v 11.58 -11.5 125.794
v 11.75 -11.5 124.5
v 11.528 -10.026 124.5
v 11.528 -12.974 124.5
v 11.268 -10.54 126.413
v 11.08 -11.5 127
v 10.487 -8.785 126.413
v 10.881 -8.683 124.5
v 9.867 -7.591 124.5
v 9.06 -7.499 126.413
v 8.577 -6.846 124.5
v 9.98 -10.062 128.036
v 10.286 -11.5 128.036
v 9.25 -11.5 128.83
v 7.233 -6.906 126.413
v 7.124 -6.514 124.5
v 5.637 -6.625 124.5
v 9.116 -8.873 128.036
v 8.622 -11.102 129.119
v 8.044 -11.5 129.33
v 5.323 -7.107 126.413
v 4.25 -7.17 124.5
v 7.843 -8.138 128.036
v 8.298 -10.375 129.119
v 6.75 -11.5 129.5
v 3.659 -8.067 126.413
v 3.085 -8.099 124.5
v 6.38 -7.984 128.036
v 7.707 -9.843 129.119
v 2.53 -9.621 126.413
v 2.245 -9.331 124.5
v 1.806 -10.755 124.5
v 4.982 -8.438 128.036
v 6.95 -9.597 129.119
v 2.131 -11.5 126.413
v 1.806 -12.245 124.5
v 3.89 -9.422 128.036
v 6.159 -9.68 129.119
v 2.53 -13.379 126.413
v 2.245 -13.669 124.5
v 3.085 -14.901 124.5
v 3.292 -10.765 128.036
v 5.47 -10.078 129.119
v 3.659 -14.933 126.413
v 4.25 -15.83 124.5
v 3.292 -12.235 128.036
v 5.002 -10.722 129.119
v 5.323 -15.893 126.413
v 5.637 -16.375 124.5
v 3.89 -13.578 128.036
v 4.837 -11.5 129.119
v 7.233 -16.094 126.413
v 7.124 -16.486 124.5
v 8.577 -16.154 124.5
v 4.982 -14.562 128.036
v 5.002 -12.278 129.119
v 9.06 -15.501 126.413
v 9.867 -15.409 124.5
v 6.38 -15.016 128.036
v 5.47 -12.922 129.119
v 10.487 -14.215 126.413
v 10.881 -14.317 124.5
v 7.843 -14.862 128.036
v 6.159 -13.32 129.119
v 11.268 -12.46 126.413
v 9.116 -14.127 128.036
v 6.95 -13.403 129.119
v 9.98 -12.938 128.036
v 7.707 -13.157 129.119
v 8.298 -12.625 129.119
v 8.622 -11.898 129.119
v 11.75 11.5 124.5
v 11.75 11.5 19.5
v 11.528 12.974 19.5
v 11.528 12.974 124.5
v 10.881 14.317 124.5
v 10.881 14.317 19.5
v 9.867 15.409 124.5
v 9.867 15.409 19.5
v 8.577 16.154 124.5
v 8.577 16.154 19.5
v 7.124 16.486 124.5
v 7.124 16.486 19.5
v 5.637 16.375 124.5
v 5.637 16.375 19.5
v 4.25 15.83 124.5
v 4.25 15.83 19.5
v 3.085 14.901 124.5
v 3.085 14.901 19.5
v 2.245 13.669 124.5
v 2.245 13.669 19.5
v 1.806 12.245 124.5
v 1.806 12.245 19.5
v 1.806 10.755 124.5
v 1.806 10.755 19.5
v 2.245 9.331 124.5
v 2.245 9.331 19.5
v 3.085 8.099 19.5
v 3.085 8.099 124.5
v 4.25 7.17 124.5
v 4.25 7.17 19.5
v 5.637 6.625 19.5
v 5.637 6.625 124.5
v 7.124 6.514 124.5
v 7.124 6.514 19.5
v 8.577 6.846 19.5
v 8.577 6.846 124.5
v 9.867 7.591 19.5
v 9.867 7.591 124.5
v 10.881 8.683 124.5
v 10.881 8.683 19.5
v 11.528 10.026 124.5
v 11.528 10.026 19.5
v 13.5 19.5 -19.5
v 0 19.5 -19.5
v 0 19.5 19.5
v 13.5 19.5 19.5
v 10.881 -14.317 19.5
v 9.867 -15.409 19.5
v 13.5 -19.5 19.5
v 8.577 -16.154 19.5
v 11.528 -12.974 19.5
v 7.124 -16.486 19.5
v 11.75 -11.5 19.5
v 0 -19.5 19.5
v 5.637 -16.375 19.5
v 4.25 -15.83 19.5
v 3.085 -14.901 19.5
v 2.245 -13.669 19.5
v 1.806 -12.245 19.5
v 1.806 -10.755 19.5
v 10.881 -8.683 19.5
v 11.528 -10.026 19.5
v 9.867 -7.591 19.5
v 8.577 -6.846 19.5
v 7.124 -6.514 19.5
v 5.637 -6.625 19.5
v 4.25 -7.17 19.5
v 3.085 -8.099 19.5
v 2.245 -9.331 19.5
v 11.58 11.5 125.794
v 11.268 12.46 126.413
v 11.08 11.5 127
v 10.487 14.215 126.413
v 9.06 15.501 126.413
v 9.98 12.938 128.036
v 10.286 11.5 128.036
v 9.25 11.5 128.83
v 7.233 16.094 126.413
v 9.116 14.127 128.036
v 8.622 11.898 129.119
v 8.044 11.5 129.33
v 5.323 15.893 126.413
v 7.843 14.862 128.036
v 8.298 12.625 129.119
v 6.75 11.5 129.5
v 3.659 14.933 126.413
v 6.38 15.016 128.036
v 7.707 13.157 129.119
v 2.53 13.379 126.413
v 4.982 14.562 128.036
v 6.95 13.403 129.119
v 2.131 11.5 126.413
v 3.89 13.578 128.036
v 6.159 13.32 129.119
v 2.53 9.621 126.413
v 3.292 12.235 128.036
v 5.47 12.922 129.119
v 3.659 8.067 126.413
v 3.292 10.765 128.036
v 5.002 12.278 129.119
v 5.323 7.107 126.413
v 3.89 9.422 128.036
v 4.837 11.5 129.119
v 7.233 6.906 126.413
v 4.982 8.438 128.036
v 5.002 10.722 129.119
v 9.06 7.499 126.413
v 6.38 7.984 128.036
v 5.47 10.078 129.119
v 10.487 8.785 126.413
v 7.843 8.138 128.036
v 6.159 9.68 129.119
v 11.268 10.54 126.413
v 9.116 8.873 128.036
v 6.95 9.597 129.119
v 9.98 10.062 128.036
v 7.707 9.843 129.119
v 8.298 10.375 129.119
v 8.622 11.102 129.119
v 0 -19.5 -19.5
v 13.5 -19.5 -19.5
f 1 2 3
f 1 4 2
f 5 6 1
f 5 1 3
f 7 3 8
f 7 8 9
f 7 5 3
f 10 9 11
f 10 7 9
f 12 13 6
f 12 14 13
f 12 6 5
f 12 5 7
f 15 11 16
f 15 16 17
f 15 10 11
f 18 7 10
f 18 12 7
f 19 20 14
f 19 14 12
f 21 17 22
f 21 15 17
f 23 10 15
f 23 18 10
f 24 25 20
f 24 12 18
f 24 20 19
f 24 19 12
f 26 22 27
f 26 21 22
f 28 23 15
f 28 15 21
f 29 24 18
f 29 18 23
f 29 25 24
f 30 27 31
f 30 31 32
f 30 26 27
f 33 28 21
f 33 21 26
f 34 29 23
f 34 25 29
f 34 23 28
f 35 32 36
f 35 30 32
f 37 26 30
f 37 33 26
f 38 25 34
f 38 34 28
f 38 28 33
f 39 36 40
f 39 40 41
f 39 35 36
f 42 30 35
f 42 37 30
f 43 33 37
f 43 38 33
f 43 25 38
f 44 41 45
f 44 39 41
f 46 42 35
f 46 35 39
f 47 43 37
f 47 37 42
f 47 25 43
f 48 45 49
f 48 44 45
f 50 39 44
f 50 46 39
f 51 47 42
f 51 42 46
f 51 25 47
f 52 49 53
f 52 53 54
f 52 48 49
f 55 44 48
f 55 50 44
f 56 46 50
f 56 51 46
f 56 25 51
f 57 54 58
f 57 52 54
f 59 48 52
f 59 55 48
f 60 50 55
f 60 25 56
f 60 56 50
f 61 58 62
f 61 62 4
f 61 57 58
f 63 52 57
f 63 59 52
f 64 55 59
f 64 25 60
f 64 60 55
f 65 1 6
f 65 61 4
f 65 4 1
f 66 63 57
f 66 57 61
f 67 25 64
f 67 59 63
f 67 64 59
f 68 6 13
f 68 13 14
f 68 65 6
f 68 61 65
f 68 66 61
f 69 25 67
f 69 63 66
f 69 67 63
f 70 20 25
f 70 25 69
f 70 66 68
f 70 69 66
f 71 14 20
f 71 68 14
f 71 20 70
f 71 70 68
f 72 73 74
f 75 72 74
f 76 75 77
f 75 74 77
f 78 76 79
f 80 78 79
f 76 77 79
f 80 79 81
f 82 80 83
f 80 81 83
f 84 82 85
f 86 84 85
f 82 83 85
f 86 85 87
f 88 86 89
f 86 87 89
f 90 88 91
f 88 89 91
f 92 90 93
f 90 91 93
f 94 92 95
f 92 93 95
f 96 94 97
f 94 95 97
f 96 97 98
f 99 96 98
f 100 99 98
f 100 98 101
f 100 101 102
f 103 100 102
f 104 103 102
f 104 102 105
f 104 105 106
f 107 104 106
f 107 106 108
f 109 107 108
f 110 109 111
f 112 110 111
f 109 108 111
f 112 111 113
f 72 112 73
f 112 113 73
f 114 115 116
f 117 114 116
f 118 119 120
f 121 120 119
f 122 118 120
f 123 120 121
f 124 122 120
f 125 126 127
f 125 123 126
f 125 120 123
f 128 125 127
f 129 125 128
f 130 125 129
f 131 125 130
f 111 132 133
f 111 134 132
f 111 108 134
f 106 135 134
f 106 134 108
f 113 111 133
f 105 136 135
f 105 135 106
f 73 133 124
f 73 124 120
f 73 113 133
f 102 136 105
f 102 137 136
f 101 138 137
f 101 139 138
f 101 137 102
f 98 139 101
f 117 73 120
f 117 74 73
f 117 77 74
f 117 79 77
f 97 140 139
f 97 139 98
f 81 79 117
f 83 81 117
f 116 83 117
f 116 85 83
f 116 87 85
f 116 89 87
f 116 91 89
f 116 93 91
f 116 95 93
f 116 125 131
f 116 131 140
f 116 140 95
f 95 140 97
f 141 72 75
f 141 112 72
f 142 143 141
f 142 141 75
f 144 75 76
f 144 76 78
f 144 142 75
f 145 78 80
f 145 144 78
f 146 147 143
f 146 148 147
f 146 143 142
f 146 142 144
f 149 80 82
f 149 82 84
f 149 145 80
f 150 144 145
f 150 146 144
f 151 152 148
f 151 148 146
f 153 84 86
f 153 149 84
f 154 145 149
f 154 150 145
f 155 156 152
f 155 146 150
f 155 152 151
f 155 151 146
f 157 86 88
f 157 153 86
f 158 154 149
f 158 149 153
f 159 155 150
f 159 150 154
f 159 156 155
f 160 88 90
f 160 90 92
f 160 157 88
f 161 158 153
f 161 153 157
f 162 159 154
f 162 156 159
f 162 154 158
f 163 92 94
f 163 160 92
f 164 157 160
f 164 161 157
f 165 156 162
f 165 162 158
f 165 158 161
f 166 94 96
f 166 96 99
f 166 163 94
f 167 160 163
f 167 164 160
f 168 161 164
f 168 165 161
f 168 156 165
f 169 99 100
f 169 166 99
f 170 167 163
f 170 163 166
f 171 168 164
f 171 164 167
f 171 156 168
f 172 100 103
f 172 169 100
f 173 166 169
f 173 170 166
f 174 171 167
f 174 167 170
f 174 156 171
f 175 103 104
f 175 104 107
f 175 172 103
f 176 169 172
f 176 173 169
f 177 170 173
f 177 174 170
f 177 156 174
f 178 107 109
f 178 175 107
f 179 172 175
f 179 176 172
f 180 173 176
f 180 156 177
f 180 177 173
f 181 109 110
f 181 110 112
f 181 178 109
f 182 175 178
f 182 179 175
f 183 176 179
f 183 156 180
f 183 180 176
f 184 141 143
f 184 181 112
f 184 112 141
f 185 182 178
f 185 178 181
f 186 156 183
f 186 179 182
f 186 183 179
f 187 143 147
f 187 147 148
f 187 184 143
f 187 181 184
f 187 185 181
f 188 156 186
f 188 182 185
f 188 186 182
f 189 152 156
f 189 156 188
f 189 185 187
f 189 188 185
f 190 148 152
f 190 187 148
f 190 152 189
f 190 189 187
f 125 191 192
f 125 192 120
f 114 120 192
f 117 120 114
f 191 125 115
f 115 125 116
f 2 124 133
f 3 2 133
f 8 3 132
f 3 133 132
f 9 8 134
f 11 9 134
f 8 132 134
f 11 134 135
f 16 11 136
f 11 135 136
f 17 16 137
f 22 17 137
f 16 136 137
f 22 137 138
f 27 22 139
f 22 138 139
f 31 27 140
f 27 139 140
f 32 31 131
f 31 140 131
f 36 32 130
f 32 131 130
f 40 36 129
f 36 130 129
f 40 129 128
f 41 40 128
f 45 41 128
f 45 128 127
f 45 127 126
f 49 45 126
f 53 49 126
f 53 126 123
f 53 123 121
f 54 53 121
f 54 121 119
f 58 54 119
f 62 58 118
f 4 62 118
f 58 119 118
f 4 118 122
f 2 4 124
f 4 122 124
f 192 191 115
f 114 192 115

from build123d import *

# Parameters (mm, degrees)
F0_W     = 39
F0_H     = 39
F1_DEPTH = 13.5
F2_R     = 5
F3_DEPTH = 110
F4_R     = 5


with BuildPart() as f1:
    # F0 (on Right) → F1 (new body)
    with BuildSketch(Plane.YZ):
        Rectangle(F0_W, F0_H)
    extrude(amount=F1_DEPTH)

    # F2 (on face) → F3 (join)
    with BuildSketch(Plane.XY.offset(19.5)):
        with Locations((6.75, 11.5)):
            Circle(F2_R)
        with Locations((6.75, -11.5)):
            Circle(F2_R)
    extrude(amount=F3_DEPTH)

    # F4
    f4_edges = [f1.edges().sort_by_distance(p)[0] for p in [
        (1.75, 11.5, 129.5),
        (1.75, -11.5, 129.5),
    ]]
    fillet(f4_edges, radius=F4_R)


solid = f1.part
